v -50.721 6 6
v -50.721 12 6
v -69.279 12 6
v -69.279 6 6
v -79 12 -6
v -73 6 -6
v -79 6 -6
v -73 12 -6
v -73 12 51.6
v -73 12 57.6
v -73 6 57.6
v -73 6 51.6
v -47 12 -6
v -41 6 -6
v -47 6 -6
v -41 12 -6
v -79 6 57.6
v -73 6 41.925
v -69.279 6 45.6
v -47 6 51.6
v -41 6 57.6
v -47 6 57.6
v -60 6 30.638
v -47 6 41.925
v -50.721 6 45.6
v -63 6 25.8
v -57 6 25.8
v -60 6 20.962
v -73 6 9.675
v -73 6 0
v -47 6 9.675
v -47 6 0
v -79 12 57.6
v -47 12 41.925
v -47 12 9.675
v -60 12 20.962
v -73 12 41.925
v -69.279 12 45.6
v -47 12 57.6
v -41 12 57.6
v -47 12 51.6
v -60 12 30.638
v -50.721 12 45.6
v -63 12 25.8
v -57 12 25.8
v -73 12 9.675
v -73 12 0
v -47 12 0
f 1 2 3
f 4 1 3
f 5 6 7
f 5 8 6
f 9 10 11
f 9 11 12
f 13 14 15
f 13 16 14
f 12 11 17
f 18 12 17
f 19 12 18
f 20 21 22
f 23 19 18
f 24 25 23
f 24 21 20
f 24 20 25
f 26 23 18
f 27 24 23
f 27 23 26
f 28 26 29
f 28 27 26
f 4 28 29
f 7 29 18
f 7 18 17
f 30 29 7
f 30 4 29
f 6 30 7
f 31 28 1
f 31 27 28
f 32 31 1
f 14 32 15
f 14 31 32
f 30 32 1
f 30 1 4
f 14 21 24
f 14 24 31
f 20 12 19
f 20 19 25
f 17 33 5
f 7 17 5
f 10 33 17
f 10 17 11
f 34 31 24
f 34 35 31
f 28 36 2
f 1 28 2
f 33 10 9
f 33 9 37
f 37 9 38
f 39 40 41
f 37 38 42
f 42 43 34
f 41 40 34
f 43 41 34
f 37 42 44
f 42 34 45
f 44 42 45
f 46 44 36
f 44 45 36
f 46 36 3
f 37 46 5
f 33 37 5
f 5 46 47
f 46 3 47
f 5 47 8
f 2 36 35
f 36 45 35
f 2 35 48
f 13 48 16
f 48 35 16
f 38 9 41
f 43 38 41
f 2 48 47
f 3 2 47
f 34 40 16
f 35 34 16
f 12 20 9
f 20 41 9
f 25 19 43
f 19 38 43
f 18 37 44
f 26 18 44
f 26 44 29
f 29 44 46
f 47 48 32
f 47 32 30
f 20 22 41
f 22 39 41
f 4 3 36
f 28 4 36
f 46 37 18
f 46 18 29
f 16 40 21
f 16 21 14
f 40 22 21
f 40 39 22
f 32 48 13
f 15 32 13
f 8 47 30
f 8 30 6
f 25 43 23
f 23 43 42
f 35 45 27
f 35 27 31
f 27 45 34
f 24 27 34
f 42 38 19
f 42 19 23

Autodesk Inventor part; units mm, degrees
ref_plane "YZ Plane" through (0, 0, 0) normal (1, 0, 0) x (0, 1, 0)
ref_plane "XZ Plane" through (0, 0, 0) normal (0, 1, 0) x (-1, 0, 0)
ref_plane "XY Plane" through (0, 0, 0) normal (0, 0, 1) x (1, 0, 0)
ref_plane "Work Plane2" through (-47, 12, 0) normal (0, -1, 0) x (0, 0, -1)
sketch "Sketch2" plane through (-47, 12, 0) normal (0, -1, 0) x (0, 0, -1)
  line L0 (0, 0) -> (0, 6) projected
  line L1 (0, 0) -> (6, 0) projected
  line L2 (6, 6) -> (6, 0) projected
  line L3 (0, 6) -> (6, 6) projected
  line L4 (0, -32) -> (0, -26) projected
  line L5 (0, -32) -> (6, -32) projected
  line L6 (6, -26) -> (6, -32) projected
  line L7 (0, -26) -> (6, -26) projected
  line L8 (-57.6, -32) -> (-57.6, -26) projected
  line L9 (-57.6, -32) -> (-51.6, -32) projected
  line L10 (-51.6, -26) -> (-51.6, -32) projected
  line L11 (-57.6, -26) -> (-51.6, -26) projected
  line L12 (-57.6, 0) -> (-57.6, 6) projected
  line L13 (-57.6, 0) -> (-51.6, 0) projected
  line L14 (-51.6, 6) -> (-51.6, 0) projected
  line L15 (-57.6, 6) -> (-51.6, 6) projected
  line L16 (-51.6, 6) -> (0, 6)
  line L17 (0, 0) -> (-51.6, 0)
  line L18 (-51.6, 0) -> (0, -32)
  line L19 (0, -26) -> (-51.6, 6)
  line L20 (-51.6, -32) -> (0, 0)
  line L21 (-51.6, -26) -> (0, 6)
  line L22 (0, -32) -> (-51.6, -32)
  line L23 (-51.6, -26) -> (0, -26)
  line L24 (-6, 0) -> (-6, -26)
  line L25 (0, 0) -> (0, -26)
  line L26 (-45.6, -26) -> (-45.6, 0)
  line L27 (-51.6, 0) -> (-51.6, -26)
  point P0 (0, 47)
  point P1 (-20.9625, -13)
  point P2 (-6, -3.7209)
  point P3 (-6, -22.2791)
  point P4 (-25.8, -10)
  point P5 (-41.925, 0)
  point P6 (-9.675, 0)
  point P7 (-25.8, -16)
  point P8 (-9.675, -26)
  point P9 (-41.925, -26)
  point P10 (-30.6375, -13)
  point P11 (-45.6, -22.2791)
  point P12 (-45.6, -3.7209)
extrude "Extrusion1" add sketch "Sketch2" along normal blind 6 contours L17 L21 L0 | L0 L3 L2 L1 | L20 L24 L17 | L25 L19 L24 L20 | L21 L17 L19 L16 | L24 L20 L19 L21 L17 | L7 L6 L5 L4 | L23 L24 L19 | L4 L18 L23 | L19 L17 L14 | L14 L13 L12 L15 | L20 L18 L21 L19 | L19 L24 L23 L18 L20 | L22 L20 L23 L18 | L17 L26 L18 | L18 L26 L21 L27 | L19 L21 L18 L26 L17 | L20 L23 L26 L21 L18 | L9 L8 L11 L10 | L10 L23 L20 | L21 L26 L23
properties part number "CrossReinforcementUpper"
